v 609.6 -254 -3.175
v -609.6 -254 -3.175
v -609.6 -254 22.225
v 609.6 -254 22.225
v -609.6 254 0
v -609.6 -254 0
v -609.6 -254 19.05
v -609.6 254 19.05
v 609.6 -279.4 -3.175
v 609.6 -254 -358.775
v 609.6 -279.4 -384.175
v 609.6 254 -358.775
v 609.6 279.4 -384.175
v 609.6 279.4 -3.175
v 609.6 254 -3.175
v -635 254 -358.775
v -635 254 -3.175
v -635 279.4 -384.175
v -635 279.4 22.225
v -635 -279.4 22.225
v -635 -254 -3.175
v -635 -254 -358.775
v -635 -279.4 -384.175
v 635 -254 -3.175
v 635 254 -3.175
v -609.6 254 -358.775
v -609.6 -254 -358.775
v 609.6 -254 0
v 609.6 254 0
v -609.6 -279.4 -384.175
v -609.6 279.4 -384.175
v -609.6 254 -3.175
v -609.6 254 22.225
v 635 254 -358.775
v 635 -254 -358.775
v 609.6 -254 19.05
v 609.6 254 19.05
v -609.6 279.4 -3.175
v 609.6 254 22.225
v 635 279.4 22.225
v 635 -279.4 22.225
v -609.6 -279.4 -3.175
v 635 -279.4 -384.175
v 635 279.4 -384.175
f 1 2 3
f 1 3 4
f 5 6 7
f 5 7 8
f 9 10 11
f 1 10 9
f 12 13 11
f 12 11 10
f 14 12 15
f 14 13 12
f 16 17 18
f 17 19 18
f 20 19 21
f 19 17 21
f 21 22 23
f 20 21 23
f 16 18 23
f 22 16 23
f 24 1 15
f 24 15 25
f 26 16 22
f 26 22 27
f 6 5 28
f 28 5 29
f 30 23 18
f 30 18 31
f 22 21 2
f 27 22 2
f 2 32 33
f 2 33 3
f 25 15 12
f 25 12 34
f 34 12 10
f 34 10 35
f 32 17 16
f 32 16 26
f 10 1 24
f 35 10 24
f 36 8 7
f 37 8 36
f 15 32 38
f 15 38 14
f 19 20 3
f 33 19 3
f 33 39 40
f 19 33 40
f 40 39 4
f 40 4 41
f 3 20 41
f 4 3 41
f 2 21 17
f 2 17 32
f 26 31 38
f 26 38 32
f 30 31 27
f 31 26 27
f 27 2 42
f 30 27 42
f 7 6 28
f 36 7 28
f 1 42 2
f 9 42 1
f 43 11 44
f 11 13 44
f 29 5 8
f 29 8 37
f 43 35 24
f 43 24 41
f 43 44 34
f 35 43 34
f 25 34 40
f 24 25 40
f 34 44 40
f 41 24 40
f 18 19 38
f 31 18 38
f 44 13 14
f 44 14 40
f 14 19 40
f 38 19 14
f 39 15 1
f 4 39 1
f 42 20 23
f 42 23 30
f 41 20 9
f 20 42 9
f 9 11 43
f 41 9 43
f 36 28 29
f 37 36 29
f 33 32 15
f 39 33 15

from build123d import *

# Parameters (mm, degrees)
F0_W     = 1219.2
F0_H     = 508
F1_DEPTH = 19.05
F3_W     = 1270
F3_H     = 558.8
F3_W_2   = 1219.2
F3_H_2   = 508
F4_DEPTH = 25.4
F5_W     = 25.4
F5_H     = 25.4
F6_DEPTH = 381
F7_W     = 25.4
F7_H     = 25.4
F8_DEPTH = 508


with BuildPart() as f1:
    # F0 (on Top) → F1 (new body)
    with BuildSketch(Plane.XY):
        Rectangle(F0_W, F0_H)
    extrude(amount=F1_DEPTH)


with BuildPart() as f4:
    # F3 (on offset) → F4 (new body)
    with BuildSketch(Plane(origin=(0, 0, -3.175), x_dir=(1, 0, 0), z_dir=(0, 0, -1))):
        Rectangle(F3_W, F3_H)
        Rectangle(F3_W_2, F3_H_2, mode=Mode.SUBTRACT)
    extrude(amount=-F4_DEPTH)

    # F5 (on face) → F6 (join)
    with BuildSketch(Plane(origin=(0, 0, -3.175), x_dir=(1, 0, 0), z_dir=(0, 0, -1))):
        with Locations((622.3, -266.7)):
            Rectangle(F5_W, F5_H)
        with Locations((622.3, 266.7)):
            Rectangle(F5_W, F5_H)
        with Locations((-622.3, 266.7)):
            Rectangle(F5_W, F5_H)
        with Locations((-622.3, -266.7)):
            Rectangle(F5_W, F5_H)
    extrude(amount=F6_DEPTH)

    # F7 (on face) → F8 (join)
    with BuildSketch(Plane.XZ.offset(-254)):
        with Locations((622.3, -371.475)):
            Rectangle(F7_W, F7_H)
        with Locations((-622.3, -371.475)):
            Rectangle(F7_W, F7_H)
    extrude(amount=F8_DEPTH)


solid = Compound([f1.part, f4.part])
